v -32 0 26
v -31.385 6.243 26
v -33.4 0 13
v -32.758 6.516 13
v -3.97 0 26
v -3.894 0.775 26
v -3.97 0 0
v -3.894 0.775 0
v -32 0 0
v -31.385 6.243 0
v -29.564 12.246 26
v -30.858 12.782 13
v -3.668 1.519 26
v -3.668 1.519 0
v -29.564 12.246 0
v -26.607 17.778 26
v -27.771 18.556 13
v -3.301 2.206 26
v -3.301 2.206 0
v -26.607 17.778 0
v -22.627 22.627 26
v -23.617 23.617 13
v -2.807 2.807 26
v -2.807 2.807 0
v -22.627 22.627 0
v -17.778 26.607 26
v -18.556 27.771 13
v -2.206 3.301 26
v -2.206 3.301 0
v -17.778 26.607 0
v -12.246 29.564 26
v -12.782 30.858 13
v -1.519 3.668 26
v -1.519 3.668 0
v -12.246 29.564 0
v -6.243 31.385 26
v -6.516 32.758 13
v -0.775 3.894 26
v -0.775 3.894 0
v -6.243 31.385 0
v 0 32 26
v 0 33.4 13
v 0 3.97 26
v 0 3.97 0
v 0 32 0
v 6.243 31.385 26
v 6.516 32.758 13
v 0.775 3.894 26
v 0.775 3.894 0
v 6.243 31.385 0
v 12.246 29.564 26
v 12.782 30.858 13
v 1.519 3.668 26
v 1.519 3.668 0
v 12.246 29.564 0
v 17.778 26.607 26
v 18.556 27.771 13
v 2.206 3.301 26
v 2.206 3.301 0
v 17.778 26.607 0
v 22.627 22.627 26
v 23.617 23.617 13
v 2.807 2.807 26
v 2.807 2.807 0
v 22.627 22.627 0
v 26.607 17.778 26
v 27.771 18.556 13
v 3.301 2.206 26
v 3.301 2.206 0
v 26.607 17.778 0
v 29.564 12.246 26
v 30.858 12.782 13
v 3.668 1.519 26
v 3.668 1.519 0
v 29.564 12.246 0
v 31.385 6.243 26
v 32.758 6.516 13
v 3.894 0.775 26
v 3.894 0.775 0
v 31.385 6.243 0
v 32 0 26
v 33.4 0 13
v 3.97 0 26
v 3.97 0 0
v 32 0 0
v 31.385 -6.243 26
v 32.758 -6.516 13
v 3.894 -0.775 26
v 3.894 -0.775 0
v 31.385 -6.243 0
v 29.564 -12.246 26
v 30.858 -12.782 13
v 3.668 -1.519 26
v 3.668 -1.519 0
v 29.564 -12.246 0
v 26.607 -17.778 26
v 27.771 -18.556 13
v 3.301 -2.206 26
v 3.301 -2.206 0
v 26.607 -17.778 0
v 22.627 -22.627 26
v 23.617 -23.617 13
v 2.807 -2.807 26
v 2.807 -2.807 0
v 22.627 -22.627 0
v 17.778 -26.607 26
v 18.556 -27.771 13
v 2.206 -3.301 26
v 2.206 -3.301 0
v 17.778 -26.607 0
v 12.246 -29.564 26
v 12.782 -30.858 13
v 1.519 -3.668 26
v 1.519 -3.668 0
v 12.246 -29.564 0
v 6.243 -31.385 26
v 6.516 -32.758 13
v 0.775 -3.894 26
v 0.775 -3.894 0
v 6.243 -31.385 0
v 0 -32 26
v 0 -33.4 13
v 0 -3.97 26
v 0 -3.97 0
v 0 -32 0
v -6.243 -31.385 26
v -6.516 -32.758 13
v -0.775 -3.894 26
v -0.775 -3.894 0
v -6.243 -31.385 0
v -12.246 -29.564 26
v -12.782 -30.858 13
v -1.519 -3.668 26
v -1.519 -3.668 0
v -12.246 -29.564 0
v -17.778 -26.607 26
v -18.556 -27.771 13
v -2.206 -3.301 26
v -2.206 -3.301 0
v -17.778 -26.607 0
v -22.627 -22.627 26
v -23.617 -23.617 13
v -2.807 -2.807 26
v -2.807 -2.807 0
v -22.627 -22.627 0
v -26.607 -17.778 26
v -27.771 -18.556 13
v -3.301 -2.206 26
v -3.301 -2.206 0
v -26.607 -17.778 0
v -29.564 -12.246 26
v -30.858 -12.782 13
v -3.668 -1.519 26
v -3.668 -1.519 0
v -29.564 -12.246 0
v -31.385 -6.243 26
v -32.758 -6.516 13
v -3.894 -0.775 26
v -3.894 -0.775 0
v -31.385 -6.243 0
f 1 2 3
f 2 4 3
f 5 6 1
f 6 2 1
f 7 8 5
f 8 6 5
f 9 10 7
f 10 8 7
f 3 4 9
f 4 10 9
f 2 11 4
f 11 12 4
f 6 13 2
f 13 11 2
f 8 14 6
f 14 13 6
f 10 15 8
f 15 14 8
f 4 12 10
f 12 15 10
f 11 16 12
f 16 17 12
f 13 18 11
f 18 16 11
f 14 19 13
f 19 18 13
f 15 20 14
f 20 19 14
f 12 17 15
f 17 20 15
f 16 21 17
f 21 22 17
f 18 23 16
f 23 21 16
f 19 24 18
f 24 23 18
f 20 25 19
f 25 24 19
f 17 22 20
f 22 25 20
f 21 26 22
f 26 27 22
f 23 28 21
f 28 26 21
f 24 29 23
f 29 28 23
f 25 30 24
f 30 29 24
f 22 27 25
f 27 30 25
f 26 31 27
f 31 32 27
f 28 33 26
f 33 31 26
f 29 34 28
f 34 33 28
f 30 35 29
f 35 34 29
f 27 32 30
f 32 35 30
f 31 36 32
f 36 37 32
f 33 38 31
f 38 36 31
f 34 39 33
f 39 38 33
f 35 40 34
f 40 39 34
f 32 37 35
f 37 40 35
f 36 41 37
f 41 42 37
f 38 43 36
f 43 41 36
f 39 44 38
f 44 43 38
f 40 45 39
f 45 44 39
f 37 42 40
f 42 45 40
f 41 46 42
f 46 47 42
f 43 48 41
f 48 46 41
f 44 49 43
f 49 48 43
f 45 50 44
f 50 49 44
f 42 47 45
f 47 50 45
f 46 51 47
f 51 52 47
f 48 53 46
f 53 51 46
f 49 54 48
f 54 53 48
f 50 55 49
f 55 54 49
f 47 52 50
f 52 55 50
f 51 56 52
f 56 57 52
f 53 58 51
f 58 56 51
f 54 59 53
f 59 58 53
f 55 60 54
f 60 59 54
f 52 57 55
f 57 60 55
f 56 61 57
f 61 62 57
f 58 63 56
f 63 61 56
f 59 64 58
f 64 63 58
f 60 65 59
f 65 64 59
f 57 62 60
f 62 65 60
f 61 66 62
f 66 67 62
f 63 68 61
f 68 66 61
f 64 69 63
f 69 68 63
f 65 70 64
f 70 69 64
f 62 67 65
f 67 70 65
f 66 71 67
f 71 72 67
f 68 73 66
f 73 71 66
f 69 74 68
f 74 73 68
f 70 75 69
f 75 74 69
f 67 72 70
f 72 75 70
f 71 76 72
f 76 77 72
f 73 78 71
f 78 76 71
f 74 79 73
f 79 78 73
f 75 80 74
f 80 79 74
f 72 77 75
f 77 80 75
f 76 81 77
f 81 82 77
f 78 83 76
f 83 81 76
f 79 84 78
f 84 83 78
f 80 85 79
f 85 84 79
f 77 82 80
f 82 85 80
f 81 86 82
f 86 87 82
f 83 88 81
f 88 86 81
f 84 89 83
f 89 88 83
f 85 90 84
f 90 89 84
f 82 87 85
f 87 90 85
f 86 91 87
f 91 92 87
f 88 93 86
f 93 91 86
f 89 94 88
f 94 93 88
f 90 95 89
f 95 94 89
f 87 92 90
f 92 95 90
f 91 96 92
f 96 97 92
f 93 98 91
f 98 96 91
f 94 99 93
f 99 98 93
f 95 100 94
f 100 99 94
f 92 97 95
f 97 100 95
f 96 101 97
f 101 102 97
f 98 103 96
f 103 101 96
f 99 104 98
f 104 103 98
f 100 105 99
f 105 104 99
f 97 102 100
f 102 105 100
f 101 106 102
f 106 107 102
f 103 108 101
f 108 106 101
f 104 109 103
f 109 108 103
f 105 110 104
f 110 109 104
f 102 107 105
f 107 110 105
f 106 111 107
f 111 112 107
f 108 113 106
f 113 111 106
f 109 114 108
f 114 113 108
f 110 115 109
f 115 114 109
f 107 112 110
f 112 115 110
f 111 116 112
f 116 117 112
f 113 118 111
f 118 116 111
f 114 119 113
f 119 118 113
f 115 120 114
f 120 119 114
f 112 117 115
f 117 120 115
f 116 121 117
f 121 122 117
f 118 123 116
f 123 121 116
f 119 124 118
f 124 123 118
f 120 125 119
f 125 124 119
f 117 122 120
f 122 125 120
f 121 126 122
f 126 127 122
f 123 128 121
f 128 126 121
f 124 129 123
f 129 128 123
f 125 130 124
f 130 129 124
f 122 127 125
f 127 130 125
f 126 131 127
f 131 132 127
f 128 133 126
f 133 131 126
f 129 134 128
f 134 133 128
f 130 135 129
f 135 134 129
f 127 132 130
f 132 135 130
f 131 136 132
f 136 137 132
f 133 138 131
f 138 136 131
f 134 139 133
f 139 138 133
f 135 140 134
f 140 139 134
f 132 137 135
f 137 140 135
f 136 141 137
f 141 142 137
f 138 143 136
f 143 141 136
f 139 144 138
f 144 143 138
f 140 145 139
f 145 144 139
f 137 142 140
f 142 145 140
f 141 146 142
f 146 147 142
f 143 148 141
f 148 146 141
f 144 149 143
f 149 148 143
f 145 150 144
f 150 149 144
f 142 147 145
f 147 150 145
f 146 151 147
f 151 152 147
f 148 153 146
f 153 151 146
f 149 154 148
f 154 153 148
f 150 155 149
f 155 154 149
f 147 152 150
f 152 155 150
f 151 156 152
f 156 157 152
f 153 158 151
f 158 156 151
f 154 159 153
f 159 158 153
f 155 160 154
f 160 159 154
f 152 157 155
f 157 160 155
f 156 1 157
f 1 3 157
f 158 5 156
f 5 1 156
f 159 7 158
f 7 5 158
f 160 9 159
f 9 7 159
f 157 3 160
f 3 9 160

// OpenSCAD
$fn = 32;

// ----------------------------------------------------------------------
// Belt roller: 64 mm barrel, 26 mm wide, bore 7.94 mm
// ----------------------------------------------------------------------

// --- parameters (mm) ---
bore_d = 7.94;            // bore
barrel_d = 64;            // barrel diameter
roller_w = 26;            // roller width
crown = 1.4;              // crown height at mid width

roller_profile = [[3.97, 0], [32, 0], [33.4, 13], [32, 26], [3.97, 26]];

/* the profile stays clear of the axis, so the bore comes out of the revolve */
rotate_extrude() polygon(roller_profile);
